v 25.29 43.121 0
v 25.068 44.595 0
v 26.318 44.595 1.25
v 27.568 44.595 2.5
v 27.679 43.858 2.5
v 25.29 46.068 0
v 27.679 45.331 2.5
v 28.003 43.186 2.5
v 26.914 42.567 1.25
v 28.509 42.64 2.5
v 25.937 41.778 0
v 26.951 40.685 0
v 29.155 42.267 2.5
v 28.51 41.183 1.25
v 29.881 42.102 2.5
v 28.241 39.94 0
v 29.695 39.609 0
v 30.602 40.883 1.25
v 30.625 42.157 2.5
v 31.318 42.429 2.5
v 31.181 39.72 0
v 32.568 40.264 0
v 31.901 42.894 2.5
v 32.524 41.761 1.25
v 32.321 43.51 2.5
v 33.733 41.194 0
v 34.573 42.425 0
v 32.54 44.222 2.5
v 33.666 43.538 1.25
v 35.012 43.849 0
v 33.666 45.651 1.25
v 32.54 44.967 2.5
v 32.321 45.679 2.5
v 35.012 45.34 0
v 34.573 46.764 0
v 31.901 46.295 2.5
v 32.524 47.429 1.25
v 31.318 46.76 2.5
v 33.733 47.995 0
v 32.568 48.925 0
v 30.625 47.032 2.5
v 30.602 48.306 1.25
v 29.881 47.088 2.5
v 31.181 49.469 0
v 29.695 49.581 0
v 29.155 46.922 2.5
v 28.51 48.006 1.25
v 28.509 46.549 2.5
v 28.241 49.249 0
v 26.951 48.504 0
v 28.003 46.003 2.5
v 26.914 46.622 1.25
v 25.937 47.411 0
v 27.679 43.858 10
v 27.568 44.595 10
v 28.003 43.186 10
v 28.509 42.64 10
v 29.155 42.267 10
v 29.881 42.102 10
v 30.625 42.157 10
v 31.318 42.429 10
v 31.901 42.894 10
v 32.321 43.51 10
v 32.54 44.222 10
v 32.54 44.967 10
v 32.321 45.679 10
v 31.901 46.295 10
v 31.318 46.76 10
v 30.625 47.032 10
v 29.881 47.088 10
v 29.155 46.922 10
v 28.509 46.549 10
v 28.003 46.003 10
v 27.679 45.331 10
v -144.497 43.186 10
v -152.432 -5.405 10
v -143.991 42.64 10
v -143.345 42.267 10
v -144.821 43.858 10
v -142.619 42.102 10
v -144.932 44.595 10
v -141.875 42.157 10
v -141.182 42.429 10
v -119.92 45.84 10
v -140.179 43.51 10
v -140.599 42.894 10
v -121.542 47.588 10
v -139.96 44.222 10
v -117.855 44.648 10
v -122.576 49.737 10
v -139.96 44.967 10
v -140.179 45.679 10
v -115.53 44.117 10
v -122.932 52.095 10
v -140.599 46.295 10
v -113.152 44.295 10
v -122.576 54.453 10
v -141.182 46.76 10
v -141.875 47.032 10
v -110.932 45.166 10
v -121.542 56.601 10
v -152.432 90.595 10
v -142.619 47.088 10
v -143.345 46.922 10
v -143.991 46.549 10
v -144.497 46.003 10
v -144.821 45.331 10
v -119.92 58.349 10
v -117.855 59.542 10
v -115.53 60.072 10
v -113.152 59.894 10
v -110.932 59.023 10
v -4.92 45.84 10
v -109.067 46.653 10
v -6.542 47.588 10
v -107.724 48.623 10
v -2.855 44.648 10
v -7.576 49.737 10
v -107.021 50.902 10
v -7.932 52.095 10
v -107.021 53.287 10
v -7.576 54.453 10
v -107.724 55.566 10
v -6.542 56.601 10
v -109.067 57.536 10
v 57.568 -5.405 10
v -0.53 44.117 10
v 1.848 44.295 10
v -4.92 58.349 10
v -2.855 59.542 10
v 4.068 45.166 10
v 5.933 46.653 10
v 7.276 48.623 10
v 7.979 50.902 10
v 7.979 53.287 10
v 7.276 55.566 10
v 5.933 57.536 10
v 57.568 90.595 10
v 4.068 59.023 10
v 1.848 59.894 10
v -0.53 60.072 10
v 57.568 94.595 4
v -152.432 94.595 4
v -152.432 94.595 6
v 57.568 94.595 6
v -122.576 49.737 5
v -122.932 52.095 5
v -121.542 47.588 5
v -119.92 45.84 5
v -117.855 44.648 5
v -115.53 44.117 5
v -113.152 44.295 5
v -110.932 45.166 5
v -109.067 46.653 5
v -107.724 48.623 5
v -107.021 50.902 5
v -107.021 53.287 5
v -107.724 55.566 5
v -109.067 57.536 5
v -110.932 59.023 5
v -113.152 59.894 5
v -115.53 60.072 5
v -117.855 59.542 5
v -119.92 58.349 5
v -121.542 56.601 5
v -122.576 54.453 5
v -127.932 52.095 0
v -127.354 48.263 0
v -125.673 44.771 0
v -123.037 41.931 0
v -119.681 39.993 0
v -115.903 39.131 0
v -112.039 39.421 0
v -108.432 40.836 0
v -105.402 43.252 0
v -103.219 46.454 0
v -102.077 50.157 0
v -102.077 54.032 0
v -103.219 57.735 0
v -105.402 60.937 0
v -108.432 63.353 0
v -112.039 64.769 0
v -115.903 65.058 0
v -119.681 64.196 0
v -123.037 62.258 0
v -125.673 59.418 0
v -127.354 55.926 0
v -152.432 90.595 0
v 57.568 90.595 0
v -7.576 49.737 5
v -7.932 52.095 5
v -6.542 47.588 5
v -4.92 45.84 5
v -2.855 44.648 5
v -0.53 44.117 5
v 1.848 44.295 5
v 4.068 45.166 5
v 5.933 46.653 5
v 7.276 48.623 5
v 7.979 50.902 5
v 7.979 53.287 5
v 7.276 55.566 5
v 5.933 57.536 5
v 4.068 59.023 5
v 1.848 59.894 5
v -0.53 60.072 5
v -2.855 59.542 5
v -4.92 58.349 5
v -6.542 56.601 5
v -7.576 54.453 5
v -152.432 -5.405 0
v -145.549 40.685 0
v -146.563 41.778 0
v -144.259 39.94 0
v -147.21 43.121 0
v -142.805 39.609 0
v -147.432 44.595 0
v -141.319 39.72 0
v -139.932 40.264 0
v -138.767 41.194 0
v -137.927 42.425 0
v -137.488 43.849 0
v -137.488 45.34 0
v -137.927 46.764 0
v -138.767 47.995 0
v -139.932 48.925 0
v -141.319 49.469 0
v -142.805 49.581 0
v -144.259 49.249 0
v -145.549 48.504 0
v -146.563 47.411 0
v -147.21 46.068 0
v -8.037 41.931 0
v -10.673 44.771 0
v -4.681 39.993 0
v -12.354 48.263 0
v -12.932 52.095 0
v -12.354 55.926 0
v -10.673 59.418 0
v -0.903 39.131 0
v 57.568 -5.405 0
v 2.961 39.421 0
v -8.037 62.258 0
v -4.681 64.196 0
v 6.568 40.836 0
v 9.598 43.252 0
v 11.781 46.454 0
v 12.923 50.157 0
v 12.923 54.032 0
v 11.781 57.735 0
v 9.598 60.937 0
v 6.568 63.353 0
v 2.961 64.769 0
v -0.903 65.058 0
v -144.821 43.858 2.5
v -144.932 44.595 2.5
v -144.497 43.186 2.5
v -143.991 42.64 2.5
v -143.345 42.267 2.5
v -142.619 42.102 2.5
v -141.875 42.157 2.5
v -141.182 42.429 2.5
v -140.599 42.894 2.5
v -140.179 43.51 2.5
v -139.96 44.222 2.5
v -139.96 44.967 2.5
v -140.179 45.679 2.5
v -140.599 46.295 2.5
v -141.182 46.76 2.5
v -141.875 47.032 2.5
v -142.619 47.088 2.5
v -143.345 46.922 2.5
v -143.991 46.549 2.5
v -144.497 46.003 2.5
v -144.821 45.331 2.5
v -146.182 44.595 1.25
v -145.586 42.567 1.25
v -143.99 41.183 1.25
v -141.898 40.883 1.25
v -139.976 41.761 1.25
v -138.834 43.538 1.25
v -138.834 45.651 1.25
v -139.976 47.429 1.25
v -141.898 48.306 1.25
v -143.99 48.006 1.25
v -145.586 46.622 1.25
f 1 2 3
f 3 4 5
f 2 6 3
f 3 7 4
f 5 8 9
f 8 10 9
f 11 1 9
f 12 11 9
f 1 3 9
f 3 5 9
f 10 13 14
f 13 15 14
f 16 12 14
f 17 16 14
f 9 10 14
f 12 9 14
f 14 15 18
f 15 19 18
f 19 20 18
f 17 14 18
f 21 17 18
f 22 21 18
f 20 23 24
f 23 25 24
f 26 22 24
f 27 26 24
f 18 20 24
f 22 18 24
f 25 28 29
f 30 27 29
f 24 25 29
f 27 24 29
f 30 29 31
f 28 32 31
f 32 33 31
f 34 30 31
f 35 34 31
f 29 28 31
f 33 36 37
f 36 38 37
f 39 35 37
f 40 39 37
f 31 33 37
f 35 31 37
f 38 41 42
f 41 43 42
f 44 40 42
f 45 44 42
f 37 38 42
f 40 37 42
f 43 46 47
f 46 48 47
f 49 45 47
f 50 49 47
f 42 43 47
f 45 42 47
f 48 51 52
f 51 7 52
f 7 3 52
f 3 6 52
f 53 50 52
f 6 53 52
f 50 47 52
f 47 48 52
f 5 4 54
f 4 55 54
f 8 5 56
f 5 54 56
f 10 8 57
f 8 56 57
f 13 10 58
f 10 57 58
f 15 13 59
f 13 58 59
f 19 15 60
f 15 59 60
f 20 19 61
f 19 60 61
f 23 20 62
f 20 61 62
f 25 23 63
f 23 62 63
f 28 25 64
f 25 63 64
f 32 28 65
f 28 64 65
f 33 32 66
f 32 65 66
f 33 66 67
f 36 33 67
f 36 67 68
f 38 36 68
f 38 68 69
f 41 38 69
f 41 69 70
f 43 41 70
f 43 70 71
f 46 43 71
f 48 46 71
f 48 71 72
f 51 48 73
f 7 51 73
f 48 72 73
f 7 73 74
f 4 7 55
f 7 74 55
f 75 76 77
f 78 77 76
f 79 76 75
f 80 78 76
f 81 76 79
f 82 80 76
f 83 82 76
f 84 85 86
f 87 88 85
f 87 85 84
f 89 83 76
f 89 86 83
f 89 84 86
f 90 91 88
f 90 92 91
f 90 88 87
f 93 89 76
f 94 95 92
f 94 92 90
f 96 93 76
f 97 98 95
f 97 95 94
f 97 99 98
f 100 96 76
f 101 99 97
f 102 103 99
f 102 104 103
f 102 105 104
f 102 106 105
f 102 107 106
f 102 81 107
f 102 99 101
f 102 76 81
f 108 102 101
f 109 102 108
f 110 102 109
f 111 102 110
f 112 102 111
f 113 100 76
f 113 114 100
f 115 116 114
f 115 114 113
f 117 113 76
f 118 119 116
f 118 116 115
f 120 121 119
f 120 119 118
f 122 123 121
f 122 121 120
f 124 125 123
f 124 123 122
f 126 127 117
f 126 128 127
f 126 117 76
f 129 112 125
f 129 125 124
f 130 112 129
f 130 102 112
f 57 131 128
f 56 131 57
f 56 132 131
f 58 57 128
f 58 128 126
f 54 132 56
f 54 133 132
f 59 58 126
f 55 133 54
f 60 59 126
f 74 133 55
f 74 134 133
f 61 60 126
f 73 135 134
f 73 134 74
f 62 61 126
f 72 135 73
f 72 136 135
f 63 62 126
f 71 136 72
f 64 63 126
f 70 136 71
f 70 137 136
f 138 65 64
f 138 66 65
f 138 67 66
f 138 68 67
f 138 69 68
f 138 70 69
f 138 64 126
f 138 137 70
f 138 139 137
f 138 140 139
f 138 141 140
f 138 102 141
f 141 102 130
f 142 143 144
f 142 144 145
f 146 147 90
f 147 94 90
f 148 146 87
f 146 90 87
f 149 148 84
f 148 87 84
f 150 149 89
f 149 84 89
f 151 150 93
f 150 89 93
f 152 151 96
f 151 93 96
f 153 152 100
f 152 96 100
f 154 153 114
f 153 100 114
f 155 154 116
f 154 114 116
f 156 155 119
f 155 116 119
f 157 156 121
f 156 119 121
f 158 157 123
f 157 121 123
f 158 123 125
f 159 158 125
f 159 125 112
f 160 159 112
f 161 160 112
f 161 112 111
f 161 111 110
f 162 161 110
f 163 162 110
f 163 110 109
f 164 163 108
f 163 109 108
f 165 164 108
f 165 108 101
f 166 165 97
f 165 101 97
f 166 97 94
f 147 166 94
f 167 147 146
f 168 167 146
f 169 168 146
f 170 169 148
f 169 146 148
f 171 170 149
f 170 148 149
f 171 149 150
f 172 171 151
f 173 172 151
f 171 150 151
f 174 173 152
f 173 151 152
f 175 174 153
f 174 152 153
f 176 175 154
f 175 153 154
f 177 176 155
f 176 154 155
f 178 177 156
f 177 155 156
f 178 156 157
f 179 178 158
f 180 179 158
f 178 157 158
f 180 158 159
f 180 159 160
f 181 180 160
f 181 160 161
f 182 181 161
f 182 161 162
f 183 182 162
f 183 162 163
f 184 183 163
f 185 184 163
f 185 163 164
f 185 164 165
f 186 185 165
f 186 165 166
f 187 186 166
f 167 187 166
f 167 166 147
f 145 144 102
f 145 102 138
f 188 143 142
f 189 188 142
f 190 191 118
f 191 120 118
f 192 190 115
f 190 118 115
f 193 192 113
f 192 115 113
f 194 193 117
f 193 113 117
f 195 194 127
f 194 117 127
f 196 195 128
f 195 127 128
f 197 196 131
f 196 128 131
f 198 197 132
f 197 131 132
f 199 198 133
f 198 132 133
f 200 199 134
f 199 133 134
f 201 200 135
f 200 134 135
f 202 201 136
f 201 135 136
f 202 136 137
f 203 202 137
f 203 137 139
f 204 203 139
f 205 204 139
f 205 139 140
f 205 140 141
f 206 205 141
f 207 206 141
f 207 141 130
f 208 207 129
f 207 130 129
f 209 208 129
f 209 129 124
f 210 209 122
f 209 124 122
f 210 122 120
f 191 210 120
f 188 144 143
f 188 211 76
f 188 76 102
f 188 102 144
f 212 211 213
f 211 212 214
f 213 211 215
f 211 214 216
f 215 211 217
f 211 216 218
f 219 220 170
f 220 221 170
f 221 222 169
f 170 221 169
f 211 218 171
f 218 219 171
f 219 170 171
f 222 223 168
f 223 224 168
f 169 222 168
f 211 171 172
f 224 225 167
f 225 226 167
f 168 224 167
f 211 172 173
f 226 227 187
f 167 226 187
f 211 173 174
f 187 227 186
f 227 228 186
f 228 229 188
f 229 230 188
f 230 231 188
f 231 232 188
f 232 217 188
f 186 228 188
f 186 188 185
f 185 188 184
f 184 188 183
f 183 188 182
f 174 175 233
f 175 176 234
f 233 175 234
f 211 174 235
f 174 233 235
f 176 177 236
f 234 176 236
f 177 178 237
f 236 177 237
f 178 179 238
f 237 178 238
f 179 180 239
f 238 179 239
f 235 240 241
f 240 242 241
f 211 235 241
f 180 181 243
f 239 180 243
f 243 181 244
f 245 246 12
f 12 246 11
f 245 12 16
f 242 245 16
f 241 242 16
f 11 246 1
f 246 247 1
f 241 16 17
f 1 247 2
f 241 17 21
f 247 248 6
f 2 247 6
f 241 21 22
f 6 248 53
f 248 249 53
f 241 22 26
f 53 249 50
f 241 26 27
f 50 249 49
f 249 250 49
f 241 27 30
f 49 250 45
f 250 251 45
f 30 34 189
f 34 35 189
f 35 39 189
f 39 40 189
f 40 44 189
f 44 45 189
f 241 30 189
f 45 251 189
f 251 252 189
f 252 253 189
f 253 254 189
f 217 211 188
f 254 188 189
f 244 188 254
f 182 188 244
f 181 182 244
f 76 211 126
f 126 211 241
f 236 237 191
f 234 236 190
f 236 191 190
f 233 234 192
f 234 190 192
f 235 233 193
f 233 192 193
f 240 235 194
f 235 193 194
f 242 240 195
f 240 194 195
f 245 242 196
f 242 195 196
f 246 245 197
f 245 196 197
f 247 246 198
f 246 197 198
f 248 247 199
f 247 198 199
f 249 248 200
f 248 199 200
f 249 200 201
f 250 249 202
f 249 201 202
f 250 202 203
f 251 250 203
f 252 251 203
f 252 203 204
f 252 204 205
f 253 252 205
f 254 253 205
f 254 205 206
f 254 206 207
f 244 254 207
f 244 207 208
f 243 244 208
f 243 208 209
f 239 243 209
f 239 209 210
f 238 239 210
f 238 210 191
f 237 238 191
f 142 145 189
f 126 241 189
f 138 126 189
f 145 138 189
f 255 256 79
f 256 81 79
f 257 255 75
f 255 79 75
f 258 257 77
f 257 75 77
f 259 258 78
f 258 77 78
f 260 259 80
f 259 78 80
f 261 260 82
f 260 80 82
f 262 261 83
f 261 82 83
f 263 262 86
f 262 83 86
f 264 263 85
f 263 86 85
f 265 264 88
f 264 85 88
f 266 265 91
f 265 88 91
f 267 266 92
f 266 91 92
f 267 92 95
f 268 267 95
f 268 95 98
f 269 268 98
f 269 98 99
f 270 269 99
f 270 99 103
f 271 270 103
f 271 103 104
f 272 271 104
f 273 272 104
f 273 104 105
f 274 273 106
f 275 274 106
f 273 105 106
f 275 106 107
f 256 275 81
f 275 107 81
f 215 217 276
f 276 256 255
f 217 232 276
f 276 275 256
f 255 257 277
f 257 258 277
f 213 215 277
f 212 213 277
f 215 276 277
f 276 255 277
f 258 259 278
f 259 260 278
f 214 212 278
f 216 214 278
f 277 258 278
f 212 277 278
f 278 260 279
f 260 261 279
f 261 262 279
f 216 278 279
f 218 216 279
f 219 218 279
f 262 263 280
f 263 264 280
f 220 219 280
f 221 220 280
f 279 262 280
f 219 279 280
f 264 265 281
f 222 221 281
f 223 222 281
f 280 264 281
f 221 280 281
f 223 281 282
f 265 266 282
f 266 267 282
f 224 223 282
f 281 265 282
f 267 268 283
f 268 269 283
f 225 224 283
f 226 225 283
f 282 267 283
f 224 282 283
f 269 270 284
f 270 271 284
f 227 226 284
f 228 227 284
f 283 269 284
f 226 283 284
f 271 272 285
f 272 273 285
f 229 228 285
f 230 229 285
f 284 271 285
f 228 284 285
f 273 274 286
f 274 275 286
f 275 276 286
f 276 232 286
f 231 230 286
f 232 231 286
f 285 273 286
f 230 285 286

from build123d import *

# Parameters (mm, degrees)
F0_W           = 210
F0_H           = 100
F1_DEPTH       = 10
F2_D           = 5
F2_CSINK_D     = 10
F2_CSINK_ANGLE = 90
F3_D           = 16
F3_CSINK_D     = 26
F3_CSINK_ANGLE = 90
F4_SIZE        = 4


with BuildPart() as f1:
    # F0 (on Top) → F1 (new body)
    with BuildSketch(Plane.XY):
        with Locations((-47.4317967892, 44.5945628711)):
            Rectangle(F0_W, F0_H)
    extrude(amount=F1_DEPTH)

    # F2 (through all)
    with Locations(Plane(origin=(0, 0, 0), x_dir=(1, 0, 0), z_dir=(0, 0, -1))):
        with Locations((30.0682032108, -44.5945628711), (-142.4317967892, -44.5945628711)):
            CounterSinkHole(F2_D / 2, F2_CSINK_D / 2, counter_sink_angle=F2_CSINK_ANGLE)

    # F3 (through all)
    with Locations(Plane(origin=(0, 0, 0), x_dir=(1, 0, 0), z_dir=(0, 0, -1))):
        with Locations((-114.9317967892, -52.0945628711), (0.0682032108, -52.0945628711)):
            CounterSinkHole(F3_D / 2, F3_CSINK_D / 2, counter_sink_angle=F3_CSINK_ANGLE)

    # F4
    f4_edges = [f1.edges().sort_by_distance(p)[0] for p in [
        (-47.431797, 94.594563, 0),
        (-47.431797, 94.594563, 10),
    ]]
    chamfer(f4_edges, length=F4_SIZE)


solid = f1.part
